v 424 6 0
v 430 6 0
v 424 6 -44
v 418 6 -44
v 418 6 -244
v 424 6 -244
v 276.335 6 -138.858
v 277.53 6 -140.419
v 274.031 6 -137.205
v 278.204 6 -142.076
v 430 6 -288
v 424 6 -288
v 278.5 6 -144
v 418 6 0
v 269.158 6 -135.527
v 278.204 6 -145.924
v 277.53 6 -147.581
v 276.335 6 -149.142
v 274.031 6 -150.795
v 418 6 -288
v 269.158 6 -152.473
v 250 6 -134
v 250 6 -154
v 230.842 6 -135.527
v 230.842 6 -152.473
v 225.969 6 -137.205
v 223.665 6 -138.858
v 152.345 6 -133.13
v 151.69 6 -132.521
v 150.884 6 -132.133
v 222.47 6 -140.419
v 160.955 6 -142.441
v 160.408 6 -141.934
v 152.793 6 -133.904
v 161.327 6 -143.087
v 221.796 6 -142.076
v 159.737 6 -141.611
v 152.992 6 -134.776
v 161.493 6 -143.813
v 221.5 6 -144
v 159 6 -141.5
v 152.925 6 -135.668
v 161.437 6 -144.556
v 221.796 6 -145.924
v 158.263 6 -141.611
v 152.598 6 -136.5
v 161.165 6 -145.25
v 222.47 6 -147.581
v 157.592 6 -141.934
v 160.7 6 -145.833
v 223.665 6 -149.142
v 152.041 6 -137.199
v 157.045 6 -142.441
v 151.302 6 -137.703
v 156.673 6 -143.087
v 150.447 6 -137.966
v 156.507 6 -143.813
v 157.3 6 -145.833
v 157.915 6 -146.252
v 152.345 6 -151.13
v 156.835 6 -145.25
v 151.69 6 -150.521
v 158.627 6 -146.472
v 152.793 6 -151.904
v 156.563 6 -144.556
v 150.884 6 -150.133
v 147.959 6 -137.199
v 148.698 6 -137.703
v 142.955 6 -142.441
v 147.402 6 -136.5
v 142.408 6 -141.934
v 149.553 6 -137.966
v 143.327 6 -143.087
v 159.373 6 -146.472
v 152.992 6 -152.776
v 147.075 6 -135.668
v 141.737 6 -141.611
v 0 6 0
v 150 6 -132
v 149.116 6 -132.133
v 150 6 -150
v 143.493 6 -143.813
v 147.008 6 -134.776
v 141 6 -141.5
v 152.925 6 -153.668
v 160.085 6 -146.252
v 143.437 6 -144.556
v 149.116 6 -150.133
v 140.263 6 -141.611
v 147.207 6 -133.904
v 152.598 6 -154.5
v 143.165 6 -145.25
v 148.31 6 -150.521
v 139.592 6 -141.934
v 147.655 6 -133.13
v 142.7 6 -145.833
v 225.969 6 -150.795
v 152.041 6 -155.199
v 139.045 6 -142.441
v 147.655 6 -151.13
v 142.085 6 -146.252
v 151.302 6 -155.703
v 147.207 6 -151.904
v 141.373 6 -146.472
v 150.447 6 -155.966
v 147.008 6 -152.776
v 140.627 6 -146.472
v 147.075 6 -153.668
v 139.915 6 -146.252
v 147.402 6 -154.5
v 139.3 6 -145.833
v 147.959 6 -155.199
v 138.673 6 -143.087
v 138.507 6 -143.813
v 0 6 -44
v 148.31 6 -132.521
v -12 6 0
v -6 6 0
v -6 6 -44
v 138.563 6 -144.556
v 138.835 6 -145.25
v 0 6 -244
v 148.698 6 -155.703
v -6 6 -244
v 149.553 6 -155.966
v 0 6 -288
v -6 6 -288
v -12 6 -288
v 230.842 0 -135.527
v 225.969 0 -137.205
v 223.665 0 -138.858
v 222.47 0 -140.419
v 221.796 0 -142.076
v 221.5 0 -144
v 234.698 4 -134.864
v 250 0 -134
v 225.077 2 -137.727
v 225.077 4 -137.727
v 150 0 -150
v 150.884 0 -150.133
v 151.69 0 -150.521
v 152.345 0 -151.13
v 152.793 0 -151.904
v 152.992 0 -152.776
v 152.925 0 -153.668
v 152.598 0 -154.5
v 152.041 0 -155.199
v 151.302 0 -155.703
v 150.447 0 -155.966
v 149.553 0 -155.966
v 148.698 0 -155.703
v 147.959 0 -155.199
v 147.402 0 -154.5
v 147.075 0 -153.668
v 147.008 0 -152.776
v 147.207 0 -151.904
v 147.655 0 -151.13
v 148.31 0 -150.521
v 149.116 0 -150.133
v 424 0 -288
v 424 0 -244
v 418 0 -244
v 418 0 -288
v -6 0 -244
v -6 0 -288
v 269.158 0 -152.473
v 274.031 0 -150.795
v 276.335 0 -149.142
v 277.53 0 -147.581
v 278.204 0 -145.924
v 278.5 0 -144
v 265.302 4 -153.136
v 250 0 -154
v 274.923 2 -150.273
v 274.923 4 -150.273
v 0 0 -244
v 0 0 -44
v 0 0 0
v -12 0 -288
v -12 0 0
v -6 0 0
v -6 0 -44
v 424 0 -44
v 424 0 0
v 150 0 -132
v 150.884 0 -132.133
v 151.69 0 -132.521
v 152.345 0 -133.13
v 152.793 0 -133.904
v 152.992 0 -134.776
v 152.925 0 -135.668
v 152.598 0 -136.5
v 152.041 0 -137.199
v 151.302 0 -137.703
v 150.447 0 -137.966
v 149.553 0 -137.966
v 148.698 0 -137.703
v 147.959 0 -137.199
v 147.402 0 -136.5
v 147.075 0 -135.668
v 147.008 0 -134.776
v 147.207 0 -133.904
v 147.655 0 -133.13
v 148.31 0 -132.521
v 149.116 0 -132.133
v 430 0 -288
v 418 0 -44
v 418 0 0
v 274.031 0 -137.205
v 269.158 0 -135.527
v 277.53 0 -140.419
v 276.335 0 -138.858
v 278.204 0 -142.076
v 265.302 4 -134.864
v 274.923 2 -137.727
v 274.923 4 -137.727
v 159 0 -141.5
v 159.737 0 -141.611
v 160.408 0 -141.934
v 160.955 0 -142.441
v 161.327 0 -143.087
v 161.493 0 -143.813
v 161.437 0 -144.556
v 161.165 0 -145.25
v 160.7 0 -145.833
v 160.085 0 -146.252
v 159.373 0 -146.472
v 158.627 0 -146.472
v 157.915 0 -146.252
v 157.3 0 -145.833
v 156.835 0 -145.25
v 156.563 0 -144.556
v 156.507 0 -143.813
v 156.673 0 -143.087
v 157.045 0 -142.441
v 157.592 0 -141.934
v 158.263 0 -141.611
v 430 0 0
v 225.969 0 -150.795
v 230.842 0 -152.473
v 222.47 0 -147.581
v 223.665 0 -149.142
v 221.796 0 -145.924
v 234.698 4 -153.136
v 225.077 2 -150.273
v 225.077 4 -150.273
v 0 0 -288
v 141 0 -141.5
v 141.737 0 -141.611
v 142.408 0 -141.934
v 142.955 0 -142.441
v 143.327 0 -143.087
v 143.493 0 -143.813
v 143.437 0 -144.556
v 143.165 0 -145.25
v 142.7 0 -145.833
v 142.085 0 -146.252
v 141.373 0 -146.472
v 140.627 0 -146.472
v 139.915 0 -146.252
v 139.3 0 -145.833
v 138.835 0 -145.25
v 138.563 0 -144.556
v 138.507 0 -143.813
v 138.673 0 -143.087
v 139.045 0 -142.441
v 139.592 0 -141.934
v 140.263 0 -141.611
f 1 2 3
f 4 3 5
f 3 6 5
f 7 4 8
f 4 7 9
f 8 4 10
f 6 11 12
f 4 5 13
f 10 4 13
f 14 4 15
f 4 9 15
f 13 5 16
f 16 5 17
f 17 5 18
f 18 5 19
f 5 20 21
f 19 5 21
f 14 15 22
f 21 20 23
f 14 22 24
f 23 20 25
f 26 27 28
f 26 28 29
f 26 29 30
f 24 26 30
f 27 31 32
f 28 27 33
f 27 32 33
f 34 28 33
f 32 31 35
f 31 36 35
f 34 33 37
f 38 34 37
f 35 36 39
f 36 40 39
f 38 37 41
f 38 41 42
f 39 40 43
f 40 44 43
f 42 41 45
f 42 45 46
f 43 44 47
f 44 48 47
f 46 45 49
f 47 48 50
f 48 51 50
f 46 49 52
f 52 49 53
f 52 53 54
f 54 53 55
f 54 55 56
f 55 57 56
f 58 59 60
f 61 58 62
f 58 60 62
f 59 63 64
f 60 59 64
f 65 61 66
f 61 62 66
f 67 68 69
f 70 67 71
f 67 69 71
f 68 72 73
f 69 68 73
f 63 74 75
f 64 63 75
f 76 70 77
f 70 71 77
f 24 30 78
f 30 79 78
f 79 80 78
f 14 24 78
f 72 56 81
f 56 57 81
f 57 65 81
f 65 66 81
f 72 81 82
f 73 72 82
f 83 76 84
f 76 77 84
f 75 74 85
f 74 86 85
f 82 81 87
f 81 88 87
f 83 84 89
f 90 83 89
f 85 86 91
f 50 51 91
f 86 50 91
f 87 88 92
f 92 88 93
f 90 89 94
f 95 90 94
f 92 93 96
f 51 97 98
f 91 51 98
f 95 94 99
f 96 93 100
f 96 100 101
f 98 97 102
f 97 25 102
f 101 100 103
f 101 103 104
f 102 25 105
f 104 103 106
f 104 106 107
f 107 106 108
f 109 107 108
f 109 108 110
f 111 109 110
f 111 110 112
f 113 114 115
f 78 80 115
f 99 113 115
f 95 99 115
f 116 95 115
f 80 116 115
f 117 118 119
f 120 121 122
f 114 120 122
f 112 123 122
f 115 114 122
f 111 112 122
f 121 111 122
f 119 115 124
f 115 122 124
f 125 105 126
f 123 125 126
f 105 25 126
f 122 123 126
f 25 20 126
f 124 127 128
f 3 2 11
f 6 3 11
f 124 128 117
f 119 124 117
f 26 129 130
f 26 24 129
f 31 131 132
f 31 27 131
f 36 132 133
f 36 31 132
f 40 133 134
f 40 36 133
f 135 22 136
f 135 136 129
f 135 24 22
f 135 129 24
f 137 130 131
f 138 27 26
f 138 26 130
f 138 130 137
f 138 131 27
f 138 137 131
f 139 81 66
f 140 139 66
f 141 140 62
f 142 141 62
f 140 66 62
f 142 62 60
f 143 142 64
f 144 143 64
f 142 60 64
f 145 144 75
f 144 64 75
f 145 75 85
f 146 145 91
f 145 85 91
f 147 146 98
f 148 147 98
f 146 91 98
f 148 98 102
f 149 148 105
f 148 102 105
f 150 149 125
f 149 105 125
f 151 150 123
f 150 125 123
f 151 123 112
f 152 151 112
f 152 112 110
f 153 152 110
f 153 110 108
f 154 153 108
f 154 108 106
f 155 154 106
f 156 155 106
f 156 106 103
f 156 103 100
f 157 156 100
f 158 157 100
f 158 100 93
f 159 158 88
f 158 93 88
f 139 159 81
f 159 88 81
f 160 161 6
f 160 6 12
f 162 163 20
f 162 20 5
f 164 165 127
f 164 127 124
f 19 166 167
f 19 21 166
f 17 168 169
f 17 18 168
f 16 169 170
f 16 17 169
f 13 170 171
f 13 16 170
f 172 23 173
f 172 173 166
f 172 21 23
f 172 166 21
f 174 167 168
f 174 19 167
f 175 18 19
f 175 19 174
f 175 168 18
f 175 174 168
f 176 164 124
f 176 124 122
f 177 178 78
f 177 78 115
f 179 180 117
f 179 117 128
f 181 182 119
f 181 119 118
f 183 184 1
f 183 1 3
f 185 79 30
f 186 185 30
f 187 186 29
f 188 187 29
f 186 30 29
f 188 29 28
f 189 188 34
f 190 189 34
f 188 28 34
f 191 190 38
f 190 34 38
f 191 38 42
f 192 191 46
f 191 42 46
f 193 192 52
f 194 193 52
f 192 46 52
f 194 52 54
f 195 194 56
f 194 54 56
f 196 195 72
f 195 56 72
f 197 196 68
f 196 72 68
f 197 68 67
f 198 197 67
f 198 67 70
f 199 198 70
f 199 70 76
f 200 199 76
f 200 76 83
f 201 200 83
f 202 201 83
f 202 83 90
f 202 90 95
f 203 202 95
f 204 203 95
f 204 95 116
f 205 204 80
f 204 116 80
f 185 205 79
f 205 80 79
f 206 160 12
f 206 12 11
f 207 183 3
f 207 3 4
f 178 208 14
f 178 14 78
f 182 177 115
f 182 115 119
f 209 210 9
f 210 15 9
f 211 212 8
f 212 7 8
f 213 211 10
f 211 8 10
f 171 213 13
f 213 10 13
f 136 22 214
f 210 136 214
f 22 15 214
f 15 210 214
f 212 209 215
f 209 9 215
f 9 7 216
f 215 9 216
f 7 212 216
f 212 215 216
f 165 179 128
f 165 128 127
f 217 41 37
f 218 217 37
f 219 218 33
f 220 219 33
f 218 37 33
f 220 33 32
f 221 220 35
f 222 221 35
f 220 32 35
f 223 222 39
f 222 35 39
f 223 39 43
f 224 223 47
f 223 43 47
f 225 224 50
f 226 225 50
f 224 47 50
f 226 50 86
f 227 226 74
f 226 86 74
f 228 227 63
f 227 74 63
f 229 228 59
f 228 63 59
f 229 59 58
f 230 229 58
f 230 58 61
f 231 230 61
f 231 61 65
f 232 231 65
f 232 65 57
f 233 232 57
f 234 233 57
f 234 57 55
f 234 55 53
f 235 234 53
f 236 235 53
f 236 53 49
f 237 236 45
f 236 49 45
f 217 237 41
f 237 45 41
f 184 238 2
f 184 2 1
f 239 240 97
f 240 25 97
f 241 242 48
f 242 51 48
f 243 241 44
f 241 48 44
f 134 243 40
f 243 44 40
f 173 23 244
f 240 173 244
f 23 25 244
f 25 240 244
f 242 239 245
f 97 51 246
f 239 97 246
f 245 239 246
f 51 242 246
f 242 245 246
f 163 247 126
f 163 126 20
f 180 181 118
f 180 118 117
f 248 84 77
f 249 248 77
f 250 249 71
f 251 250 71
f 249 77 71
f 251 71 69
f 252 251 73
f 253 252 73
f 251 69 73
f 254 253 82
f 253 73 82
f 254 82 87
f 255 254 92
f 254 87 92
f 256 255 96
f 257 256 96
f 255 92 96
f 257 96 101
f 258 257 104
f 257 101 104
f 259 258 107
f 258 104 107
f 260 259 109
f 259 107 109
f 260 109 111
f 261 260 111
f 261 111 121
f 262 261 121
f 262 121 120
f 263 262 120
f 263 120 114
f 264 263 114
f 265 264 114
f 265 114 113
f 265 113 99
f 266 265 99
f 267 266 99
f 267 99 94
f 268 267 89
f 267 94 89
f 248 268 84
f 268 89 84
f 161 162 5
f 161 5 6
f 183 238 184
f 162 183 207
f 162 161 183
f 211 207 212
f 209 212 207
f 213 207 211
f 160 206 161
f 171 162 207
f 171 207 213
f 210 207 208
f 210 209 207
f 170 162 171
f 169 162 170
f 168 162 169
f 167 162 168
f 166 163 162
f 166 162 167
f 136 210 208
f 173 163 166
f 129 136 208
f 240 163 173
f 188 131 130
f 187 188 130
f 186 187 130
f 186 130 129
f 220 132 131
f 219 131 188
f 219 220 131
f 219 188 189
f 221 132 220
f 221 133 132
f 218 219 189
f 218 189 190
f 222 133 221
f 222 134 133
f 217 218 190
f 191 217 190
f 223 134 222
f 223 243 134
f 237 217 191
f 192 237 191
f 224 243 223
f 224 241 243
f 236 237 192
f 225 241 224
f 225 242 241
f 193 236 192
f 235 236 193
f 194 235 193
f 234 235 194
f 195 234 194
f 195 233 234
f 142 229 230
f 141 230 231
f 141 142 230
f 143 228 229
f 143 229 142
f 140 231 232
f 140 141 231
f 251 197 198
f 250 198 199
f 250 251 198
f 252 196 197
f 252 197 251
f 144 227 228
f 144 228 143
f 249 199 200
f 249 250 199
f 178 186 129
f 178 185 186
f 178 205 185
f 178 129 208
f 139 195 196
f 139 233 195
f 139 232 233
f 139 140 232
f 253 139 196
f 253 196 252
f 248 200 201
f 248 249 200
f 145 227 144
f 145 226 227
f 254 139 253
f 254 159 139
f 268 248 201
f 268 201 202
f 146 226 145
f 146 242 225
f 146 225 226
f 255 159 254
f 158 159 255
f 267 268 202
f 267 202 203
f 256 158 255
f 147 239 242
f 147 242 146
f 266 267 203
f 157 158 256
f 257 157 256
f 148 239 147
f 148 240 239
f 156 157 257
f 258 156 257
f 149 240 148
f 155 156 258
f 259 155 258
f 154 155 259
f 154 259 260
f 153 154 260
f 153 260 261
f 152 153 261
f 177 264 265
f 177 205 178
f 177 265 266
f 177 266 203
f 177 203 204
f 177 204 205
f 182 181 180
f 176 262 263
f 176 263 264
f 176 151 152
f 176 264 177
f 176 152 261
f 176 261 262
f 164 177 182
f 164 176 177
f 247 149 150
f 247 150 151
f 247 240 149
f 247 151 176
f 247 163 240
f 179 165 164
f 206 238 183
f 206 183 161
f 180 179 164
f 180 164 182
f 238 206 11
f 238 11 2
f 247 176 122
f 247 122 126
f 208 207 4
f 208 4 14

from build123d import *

# Parameters (mm, degrees)
BOSS_EXTRUDE1_DEPTH = 6
SKETCH2_R           = 3
SKETCH2_R_2         = 2.5
CUT_EXTRUDE1_DEPTH  = 6


with BuildPart() as part:
    # Sketch1 → Boss-Extrude1 (new body)
    with BuildSketch(Plane(origin=(0, 0, 0), x_dir=(1, 0, 0), z_dir=(0, 1, 0))):
        Polygon((418, 244), (424, 244), (424, 288), (430, 288), (430, 0), (424, 0), (424, 44), (418, 44), (418, 0), (0, 0), (0, 44), (-6, 44), (-6, 0), (-12, 0), (-12, 288), (-6, 288), (-6, 244), (0, 244), (0, 288), (418, 288), align=None)
    extrude(amount=BOSS_EXTRUDE1_DEPTH)

    # Sketch2 → Cut-Extrude1 (cut)
    with BuildSketch(Plane(origin=(0, 6, 0), x_dir=(1, 0, 0), z_dir=(0, 1, 0))):
        with Locations(Location((150, 135, 0), (0, 0, 270))):
            Circle(SKETCH2_R)
        with Locations(Location((150, 153, 0), (0, 0, 270))):
            Circle(SKETCH2_R)
        with Locations(Location((141, 144, 0), (0, 0, 270))):
            Circle(SKETCH2_R_2)
        with Locations(Location((159, 144, 0), (0, 0, 270))):
            Circle(SKETCH2_R_2)
        with BuildLine():
            add(Edge.make_bspline(
                [(250, 154), (231.978482396, 153.666282679), (221.933324248, 152.446887217), (221.5, 144)],
                knots=[0, 0, 0, 0, 1, 1, 1, 1], degree=3))
            add(Edge.make_bspline(
                [(250, 134), (231.978482396, 134.333717321), (221.933324248, 135.553112783), (221.5, 144)],
                knots=[0, 0, 0, 0, 1, 1, 1, 1], degree=3))
            add(Edge.make_bspline(
                [(250, 134), (268.021517604, 134.333717321), (278.066675752, 135.553112783), (278.5, 144)],
                knots=[0, 0, 0, 0, 1, 1, 1, 1], degree=3))
            add(Edge.make_bspline(
                [(250, 154), (268.021517604, 153.666282679), (278.066675752, 152.446887217), (278.5, 144)],
                knots=[0, 0, 0, 0, 1, 1, 1, 1], degree=3))
        make_face()
    extrude(amount=-CUT_EXTRUDE1_DEPTH, mode=Mode.SUBTRACT)


solid = part.part
